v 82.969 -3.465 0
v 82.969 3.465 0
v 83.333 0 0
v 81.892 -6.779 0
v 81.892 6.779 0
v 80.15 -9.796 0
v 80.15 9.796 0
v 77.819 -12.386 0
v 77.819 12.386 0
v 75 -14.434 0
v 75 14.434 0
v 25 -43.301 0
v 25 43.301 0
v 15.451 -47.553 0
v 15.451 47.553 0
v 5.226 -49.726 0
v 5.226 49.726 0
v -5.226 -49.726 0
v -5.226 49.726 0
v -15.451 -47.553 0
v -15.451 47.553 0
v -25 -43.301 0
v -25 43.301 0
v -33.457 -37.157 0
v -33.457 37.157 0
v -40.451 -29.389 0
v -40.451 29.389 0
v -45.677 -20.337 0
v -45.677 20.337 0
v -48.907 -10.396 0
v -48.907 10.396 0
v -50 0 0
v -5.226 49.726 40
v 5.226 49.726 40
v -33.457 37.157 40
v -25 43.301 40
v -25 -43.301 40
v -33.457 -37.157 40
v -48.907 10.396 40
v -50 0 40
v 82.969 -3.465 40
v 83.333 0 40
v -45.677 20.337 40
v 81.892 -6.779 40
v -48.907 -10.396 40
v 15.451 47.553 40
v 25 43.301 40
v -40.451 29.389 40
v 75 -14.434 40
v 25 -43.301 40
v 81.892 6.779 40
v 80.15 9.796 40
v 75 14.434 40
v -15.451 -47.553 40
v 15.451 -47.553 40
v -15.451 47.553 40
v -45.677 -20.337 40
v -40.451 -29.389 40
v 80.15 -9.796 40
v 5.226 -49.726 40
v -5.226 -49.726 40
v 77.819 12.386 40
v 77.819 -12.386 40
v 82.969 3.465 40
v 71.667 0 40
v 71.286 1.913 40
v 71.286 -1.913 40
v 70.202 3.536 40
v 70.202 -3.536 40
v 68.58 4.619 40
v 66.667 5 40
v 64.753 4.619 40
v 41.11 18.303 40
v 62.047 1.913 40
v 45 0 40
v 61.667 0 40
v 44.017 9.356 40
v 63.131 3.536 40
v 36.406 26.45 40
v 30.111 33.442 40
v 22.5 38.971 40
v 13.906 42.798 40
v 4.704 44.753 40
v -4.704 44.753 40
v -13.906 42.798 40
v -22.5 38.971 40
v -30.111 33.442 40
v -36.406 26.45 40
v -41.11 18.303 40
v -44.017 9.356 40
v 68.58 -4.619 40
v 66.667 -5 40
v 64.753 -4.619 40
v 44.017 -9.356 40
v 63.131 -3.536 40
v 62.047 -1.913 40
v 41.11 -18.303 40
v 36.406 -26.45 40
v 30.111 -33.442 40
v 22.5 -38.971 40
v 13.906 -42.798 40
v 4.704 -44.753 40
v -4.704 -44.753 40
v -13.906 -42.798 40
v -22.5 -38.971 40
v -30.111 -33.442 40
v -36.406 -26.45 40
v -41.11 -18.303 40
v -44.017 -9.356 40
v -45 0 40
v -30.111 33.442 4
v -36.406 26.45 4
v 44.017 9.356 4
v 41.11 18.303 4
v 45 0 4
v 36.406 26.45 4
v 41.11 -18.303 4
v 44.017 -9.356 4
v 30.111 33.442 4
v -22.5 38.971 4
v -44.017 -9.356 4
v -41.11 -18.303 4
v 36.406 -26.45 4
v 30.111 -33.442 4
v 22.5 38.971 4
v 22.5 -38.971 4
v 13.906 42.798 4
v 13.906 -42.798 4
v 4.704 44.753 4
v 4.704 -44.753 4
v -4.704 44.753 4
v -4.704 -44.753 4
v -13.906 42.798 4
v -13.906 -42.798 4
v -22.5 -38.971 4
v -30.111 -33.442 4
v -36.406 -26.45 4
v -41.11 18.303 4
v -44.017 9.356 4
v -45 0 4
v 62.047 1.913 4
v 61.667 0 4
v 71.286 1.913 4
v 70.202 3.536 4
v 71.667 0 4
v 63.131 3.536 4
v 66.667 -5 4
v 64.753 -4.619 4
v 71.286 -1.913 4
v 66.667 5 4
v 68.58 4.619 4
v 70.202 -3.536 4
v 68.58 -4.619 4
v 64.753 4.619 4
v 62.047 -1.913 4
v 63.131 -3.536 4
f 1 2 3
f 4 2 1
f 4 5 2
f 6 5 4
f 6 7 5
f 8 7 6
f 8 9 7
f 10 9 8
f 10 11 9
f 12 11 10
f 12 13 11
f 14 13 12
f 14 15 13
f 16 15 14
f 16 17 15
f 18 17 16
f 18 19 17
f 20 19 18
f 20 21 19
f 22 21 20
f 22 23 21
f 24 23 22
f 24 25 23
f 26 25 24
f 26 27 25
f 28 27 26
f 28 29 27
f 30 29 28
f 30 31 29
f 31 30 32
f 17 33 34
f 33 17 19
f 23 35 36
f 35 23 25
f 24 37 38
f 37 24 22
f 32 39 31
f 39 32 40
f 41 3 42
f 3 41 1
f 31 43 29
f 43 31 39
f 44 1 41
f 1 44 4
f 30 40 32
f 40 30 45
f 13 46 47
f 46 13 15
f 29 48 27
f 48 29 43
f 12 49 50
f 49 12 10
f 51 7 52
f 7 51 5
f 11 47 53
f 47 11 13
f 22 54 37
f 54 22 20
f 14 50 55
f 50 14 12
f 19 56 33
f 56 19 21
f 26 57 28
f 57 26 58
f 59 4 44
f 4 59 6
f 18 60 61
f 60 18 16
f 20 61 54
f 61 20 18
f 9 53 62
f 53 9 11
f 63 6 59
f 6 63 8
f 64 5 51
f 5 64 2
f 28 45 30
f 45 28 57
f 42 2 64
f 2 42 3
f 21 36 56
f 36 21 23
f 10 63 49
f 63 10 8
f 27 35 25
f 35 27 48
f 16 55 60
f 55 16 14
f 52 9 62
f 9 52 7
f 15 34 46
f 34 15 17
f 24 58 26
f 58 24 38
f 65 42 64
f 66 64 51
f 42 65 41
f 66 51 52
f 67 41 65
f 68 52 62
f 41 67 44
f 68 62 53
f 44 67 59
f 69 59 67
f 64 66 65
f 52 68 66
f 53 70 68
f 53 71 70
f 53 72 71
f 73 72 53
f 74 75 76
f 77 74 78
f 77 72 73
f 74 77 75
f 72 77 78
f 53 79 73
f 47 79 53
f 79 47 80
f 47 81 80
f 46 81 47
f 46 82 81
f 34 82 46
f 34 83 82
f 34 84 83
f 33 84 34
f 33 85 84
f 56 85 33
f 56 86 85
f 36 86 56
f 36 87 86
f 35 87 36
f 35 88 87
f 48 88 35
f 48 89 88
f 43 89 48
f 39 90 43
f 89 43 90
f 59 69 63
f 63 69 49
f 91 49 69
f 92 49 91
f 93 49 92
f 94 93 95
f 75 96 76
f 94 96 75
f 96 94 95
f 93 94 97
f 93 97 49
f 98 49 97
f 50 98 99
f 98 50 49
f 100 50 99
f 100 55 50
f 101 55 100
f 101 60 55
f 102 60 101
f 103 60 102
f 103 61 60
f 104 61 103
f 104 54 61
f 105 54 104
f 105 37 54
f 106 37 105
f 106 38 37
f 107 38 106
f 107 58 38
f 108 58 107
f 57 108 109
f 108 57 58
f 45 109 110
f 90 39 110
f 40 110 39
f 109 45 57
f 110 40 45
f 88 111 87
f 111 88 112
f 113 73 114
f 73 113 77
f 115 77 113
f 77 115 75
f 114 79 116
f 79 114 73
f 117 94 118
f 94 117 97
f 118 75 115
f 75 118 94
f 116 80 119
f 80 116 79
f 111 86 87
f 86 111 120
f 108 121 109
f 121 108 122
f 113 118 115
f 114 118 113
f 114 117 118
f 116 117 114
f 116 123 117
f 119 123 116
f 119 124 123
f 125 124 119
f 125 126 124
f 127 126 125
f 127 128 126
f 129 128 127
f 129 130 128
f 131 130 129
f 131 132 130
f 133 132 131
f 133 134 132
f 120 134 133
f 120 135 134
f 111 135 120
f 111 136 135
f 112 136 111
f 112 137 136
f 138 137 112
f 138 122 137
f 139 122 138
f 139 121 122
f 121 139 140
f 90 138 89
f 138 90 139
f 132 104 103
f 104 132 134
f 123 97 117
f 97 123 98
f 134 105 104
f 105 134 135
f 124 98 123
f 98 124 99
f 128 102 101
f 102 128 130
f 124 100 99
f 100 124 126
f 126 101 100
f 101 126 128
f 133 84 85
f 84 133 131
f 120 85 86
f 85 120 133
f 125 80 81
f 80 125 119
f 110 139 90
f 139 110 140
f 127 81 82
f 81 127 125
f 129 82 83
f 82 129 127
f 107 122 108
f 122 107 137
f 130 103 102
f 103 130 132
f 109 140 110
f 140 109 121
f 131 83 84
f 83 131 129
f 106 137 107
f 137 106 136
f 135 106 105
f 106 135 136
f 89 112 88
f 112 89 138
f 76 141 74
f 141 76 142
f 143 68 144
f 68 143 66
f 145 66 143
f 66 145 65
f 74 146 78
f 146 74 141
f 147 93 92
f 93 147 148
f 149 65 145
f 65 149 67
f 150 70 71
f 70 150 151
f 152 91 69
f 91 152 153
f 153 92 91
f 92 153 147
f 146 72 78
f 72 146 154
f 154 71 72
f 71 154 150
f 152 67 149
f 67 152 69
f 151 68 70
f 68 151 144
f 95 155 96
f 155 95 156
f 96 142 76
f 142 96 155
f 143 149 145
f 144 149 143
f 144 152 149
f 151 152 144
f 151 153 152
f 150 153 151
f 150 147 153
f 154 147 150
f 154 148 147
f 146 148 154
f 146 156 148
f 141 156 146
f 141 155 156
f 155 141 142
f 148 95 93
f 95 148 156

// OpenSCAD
/*[Global]*/

//The payload will be 10% less. In mm.
pot_radius=50; //[50:150]

//The payload will be 10% less. In mm.
pot_depth=40; //[50:200]

//In mm.
stand_hole_radius=5; //[5:20]
 

difference(){
	shape();
	translate([0,0,pot_depth*0.1])
		cylinder(pot_depth,pot_radius*0.9,pot_radius*0.9);
	translate([pot_radius+(pot_radius/3),0,pot_depth*0.1])
		cylinder(pot_depth,stand_hole_radius,stand_hole_radius);
}

module shape(){
	hull(){
		linear_extrude(pot_depth){
			circle(pot_radius);
		}
		translate([pot_radius+(pot_radius/3),0,0]) {
			linear_extrude(pot_depth){
				circle(pot_radius/3);
			}
        }
	}
}
